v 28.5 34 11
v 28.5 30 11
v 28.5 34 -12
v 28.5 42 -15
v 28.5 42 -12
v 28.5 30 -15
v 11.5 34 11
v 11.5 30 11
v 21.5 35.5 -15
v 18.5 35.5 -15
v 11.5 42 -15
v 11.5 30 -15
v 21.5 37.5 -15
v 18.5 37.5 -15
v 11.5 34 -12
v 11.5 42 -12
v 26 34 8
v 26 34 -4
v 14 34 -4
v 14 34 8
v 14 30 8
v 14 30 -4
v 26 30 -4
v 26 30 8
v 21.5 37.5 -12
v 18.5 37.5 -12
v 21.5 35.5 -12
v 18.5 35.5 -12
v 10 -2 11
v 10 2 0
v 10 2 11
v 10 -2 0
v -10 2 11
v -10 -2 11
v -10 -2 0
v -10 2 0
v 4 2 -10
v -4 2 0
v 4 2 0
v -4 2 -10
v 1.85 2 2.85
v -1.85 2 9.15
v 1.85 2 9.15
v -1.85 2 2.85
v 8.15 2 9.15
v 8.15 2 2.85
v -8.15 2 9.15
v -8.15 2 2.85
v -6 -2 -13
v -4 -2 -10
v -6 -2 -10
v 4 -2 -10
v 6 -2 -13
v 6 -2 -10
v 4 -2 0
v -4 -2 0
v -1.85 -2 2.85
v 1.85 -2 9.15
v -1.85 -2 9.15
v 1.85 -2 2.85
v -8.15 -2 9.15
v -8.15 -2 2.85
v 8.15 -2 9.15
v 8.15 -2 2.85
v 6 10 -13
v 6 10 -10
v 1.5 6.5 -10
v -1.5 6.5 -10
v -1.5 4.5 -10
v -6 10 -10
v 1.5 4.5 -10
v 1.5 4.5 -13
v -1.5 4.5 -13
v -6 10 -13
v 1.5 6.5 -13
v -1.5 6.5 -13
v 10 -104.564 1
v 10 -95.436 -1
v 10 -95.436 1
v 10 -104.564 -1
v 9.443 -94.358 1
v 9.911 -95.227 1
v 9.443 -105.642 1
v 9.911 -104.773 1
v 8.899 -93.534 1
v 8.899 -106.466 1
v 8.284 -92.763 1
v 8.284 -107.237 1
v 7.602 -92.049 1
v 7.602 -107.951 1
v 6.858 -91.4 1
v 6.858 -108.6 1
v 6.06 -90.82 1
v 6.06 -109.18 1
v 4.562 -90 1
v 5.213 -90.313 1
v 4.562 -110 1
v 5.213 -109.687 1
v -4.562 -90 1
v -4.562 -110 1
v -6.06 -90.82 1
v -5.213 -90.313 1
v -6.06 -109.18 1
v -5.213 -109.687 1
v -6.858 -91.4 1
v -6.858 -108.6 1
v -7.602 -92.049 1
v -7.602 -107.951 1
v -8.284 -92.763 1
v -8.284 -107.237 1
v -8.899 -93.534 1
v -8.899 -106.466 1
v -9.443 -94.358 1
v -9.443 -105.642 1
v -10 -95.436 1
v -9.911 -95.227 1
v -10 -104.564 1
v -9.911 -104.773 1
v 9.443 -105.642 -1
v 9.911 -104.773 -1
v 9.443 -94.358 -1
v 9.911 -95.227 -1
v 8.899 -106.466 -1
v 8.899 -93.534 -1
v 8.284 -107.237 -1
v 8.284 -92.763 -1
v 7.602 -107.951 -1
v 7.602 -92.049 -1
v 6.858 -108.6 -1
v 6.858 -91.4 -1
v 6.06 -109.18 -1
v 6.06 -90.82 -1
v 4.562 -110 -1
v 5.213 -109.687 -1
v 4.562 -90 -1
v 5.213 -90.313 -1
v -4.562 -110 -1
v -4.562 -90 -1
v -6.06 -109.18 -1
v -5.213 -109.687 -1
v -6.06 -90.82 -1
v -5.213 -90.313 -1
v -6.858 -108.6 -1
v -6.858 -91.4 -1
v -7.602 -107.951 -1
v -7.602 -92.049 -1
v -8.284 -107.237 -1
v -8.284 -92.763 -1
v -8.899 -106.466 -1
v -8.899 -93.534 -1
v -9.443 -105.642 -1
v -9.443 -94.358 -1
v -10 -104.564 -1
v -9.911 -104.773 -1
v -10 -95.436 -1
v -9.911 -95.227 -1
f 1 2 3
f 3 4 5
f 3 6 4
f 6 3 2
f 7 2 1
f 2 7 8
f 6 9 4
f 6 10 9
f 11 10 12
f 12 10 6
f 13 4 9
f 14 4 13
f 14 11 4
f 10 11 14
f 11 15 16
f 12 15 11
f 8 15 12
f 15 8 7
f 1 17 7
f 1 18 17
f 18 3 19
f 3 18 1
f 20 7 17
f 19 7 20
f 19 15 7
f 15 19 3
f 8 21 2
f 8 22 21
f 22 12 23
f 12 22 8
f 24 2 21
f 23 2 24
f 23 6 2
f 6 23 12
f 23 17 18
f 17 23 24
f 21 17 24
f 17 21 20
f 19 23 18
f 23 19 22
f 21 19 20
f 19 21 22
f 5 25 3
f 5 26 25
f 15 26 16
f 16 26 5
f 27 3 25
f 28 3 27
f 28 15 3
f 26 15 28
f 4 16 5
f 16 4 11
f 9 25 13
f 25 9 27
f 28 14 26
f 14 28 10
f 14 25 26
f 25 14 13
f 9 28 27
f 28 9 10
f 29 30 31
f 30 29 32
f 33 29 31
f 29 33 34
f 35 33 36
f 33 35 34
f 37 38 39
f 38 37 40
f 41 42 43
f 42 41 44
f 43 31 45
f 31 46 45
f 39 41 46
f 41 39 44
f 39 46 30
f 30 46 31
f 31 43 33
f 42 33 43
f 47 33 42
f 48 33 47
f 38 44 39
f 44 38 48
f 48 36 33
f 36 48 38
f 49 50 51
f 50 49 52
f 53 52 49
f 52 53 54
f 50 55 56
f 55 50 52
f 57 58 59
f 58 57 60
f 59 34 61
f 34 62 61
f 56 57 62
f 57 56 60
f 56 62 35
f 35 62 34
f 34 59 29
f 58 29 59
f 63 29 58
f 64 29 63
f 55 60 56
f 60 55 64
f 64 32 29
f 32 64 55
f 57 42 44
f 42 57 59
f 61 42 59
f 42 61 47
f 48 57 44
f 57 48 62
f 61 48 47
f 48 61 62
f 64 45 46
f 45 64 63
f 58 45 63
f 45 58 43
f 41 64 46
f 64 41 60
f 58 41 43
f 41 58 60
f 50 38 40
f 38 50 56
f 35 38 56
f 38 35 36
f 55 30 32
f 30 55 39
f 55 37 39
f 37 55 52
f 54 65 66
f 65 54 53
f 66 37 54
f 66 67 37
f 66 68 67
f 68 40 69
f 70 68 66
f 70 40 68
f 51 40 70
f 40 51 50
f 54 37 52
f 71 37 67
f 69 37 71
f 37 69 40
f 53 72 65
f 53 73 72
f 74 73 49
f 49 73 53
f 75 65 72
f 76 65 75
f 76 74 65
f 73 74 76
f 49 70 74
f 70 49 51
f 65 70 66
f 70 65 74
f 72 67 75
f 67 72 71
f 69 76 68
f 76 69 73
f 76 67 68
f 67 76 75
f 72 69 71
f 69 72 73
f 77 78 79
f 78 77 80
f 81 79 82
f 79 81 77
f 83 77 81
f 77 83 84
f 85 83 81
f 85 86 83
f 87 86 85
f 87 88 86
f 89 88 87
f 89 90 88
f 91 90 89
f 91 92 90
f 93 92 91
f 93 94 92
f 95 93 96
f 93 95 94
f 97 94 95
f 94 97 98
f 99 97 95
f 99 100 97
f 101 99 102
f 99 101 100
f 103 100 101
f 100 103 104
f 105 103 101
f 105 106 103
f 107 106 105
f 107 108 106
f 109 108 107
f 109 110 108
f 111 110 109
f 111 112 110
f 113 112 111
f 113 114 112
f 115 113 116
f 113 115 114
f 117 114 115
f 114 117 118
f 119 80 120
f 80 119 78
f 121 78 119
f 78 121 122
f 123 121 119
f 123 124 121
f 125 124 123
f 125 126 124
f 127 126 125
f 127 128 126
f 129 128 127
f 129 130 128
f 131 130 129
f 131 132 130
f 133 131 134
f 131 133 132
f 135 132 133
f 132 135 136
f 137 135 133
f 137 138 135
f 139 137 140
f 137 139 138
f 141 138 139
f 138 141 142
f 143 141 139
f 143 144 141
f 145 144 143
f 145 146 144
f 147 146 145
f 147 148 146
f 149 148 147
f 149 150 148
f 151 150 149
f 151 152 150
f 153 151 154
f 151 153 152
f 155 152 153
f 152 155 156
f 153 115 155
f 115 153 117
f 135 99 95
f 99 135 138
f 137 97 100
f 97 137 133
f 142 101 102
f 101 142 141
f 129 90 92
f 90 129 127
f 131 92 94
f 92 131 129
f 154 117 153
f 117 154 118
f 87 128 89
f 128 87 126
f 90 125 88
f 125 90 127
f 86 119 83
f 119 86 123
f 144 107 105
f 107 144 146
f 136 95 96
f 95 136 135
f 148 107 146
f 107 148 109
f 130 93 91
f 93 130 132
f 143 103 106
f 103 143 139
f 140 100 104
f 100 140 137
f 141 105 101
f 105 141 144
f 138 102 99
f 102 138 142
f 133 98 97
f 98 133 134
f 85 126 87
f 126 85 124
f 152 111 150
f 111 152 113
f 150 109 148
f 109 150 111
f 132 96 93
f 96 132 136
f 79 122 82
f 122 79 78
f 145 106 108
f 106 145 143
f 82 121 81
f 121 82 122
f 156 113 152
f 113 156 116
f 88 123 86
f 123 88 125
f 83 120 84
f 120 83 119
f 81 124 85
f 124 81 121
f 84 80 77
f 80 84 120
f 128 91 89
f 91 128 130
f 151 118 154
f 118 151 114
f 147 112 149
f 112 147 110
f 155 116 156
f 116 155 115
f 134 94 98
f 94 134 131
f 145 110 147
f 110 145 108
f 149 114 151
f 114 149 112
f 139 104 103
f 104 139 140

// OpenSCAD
$fn=70;
//house:7x2.5x4cm

//last edit: 5 Feb 20
//translate([10,10,10]) color("green")
//import("big_base2.stl")

base_l=100;

back_color="darkgray";
back_trans=0.6;

//wheel center theke 80cm. max.

//translate([15,15,20.5]) rotate([-90,0,0]) base();
//
//difference() 
//{
//translate([-1.5,-5,0]) cube([base_l, 67,2]);
//    
//    
//translate([-1.5,32,0]) 
//    difference(){
//        curve_base();
//        translate([8,-18,-2])
//        cube([16,36,6]);
//        
//         translate([44,-15,-2])
//        cube([22,30,6]);
//    }
//// sofar(wh=false);
//  sofar(wh=true);
//    
//    c_hole();
//}
//translate([40,20,3])
//color("red") cube([40, 30, 18]);
// 
translate([20,32,12]) 
translate([0,0,-14]) 
//base_top();

//base_top_big();

button();

//cube([85,50,4]); //reference.

 
 design_tmp2();

//temporary design.
translate([0,-100,0]) {
//    design_tmp(); 
    difference() {
         cube([20,20,2], center=true);
    difference(){
    cube([20,20,2], center=true);
    cylinder(r=11, h=3, center=true);
    }
}
}

module design_tmp2() {
     difference(){
    cube([20,4,22], center=true);
        translate([-5 ,0,6])
        cube([6.3, 5,6.3], center=true);
          translate([5,0,6])
        cube([6.3, 5,6.3], center=true);
         
         translate([-14,0,-10])
        cube([20, 5,20], center=true);
         
         translate([14,0,-10])
        cube([20, 5,20], center=true);
    }
    translate([0,4,-11.5])
    difference(){
    cube([12,12,3],center=true);
        translate([0,1.5,0])
        cube([3,2,5], center=true);
        
//        translate([0,-4.5,0])
//        cube([3,2,5], center=true);
    }
}

module base_top() {
    
   
    
      difference() {
    hull() {
    sphere(r=24);
//        cylinder(r=24, h=10);
    translate([30,0,03]) sphere(r=26);
    }
     translate([-20,0,-30]) cube([20,130,180], center=true);
    
     translate([0,0,-30]) cube([180,160,80], center=true);
    
    
     for(i=[0:1]) {
        translate([-5,-18+i*36,0])
    cylinder(r=1.5, h=20);
        translate([45,-16+i*32,0]) cylinder(r=1.5, h=40);
    }
    
    hull(){
        translate([-15,0,0])
         cylinder(r=24, h=5);
    translate([30,0,00]) sphere(r=26);
    }
}
    
//    difference()
//    {
//    color("blue") sphere(r=60, center=true);
//    translate([0,0,-20]) cube([130,130,80], center=true);
//    }
}


module base_top_big() {
    
   br=30;
   bd=36;
    
      difference() 
    {
    hull() {
    sphere(r=br+4);
//        cylinder(r=24, h=10);
    translate([bd,0,10]) sphere(r=br+2);
    }
     translate([-30,0,-30]) cube([20,130,180], center=true);
    
       translate([0,0,-8]) cube([80, 80,50], center=true);
    
     translate([0,0,-31]) cube([180,160,80], center=true);
    
    
      hull() {
    sphere(r=br-2+4);
//        cylinder(r=24, h=10);
    translate([bd,0,10]) sphere(r=br);
    }
    
 
////    
//    hull(){
//        translate([-15,0,0])
//         cylinder(r=24, h=5);
//    translate([30,0,00]) sphere(r=26);
//    }
}
//    
//    difference()
//    {
//    color("blue") sphere(r=60, center=true);
//    translate([0,0,-20]) cube([130,130,80], center=true);
//    }
}




module curve_base() {
    
  hull()
    {
        
        cube([3,30,3], center=true);
        translate([5,0,0])cube([3,50,3], center=true);
        translate([12,0,0])cube([3,60,3], center=true);
        
        translate([30,0,0])cube([3,62,3], center=true);
        
        translate([50,0,0])cube([3,60,3], center=true);
        translate([70,0,0])cube([3,53,3], center=true);
        translate([80,0,0])cube([3,40,3], center=true);
         translate([87,0,0])cube([3,38,3], center=true);
         translate([96,0,0])cube([3,24,3], center=true);
         translate([100,0,0])cube([3,10,3], center=true);
    }  
}

module c_hole() {
    color("red") cube([3,2,12], center=true);
}

module sofar(wh=true){
    
if (wh==true) {
for(i=[0:2])
translate([12,2+i*20,20])
rotate([-90,0,0])
color("blue", 0.7) single_rotor();
}


translate([12,6,3]) c_hole();
translate([18,6,3]) c_hole();

//creating optional holes.
for(i=[0:3]) {
translate([35,20+i*10,-5]) color("red") cube([2,3,12]);
translate([35+18,20+i*10,-5]) color("red") cube([2,3,12]);
translate([35+36,20+i*10,-5]) color("red") cube([2,3,12]);
}
translate([77,30-10 ,-5]) color("red") cube([12,24,16]);
translate([92,30-4,-5]) color("red") cube([3,10,12]);
//box part and base

//translate([-50,0,0])  //positioning
translate([15,15,20.5])
rotate([-90,0,0])
difference()
{
    union(){
       color("darkgray", 0.5) base(); 
//        translate([-30,0,0])  //positioning
       for(i=[0:2]) {
           difference(){
            translate([0,0,i*20]) color("darkgray", 0.8) box(); 
         translate([-15,11,-1.5+i*20]) 
        cube([30,2,3]); //middle con cut 
           }
           
           translate([-15, 14, -1.5+i*20])  color("red") cube([2,12,3]); 
           
             translate([12.5, 14, -1.5+i*20])  color("red") cube([2,12,3]);
           
       }  
    }
    
    
    
         for(i=[0:2])
        translate([-15,11,-1.5+i*20]) 
        cube([30,2,3]); //middle con cut 
}
 
//the connector
//translate([-50-30,-12+5,5])  //positioning
translate([15,2.5,8])  //positioning
translate([-11,11,0]) 
for(i=[0:2]) { 
    translate([0, i*20, 0]) 
cube([22,3-0.5,2-0.8]); //middle con cut
}

 


 
rotate([0,0,5]) 
translate([ 40,-3,16]) {
    color(back_color, back_trans) button();
    translate([0,4.5,-12]) c_hole();
//    translate([0,-4.5,-12]) c_hole();
}

rotate([0,0,5]) 
translate([ 58,-2,16]){ 
    color(back_color, back_trans) button(); 
    translate([0,4.5,-12])  c_hole();
//    translate([0,-4.5,-12]) c_hole();
}

}



module button(){
    
    difference(){
    cube([17,4,26], center=true);
        translate([0,0,4])
        cube([12, 5,12], center=true);
    }
    translate([0,4,-11.5])
    difference(){
    cube([17,12,3],center=true);
        translate([0,0.5,0])
        cube([3,2,5], center=true);
        
//        translate([0,-4.5,0])
//        cube([3,2,5], center=true);
    }
}

module nano_box(){
    
    difference(){
    cube([48,6,22], center=true);
        translate([0,3,0])
         cube([44,8,17.8], center=true);
    }
    
    
//    translate([0,5,-2])
//    cube([44,2,4]);
    
    
//    cube([3,18,2]);
//    
//    cube([44,3,2]);
//    translate([2,1.5,-3])
//        cylinder(d=1.2,h=5);
//    translate([2+40.7,1.5,-3])
//        cylinder(d=1.2,h=5);
//    
//     translate([2 ,1.5+15,-3])
//        cylinder(d=1.2,h=5);
    
}


module base(){
    difference()
    {
     union(){
    translate([0, 16, 18])
    cube([21, 3,60], center=true);   //long base
    
      
         
        for(i=[0,10,20]) 
      translate([0,0,12.5-i*2]){
    difference(){
    translate([10, 14.5, 4+20])   //left butterfly
        cube([6,3,7]);    
      translate([12.5, 14, 6+20])   cube([2,5,3]);    
     }
   difference(){
    translate([-16.5 , 14.5, 4+20])   //right butterfly
        cube([6,3,7]);    
      translate([-15, 14, 6+20])  cube([2,5,3]);    
     }
    }     
   
    
     for(i=[0:2])
    translate([0,0,20*i]) {
    translate([7.7, 9, -3.5])   //left side con
    cube([3,6.5,7]);
     translate([5, 9, -3.5+6.2])   //left side exp
    cube([5.5,6,2]);  
     translate([-5-5.5, 9, -3.5+6.2])   //right side exp
    cube([5.5,6,2]);  
    translate([-7.7-3, 9, -3.5])  //right side con
    cube([3,6.5,7]);
    }
 

     }
      
     
     { //two box hole conn.
     translate([-3, 16, -9])
    cube([3, 8,2], center=true); //space cut for wire.
     translate([3, 16, -9])
    cube([3, 8,2], center=true); //space cut for wire.
     }
     
     for(i=[0:2])
      translate([0, 16, 7+i*20])
        cube([10, 8,12], center=true); //space cut for wire.
 }
 
    for(i=[0:2])
        translate([-10,12,-5.3+i*20]) 
            cube([20,3,2]); //middle conn
 
 
}

module single_rotor() {
upper();
lower();
outer();


n2 = 77; //teeth 
 
mm_per_tooth = 1; 
thickness    = 11;
hole         = 10; 

 
translate([0,0, -2.5])
gear(mm_per_tooth,n2,thickness,hole,0,168);

outer_rim_d=24;   //will be 24
translate([0,0, 3])
difference(){
cylinder(d=outer_rim_d, h=10, center=true, $fn=100);
   cylinder(d=12, h=19, center=true, $fn=100);
     
}
}



module box(){
    //4, 13, 14
    difference()
    {
        translate([0,3,0])
    cube([15,16+7,6], center=true);
       union() {
        cube([12.6,13.6,8], center=true); //inner box
        translate([0,8,3])
       cube([12.6,24,6], center=true); //half cut
        }
        
        
//        translate([-10,13,-1.5]) {
//        cube([30,2,3]);
//        }
    }
    
    
//    translate([0,1,0]) 
//    difference()
//    {
//    translate([0,13.5,-4]) 
//    cube([15,5,8], center=true); //half cut
//        
//        translate([0,12,-4]) 
//    cube([12,5,12], center=true); //half cut
//        
//          
//        translate([-10,12.5,-6]) {
//        cube([20,2,3]);
//        }
//    }
    
}
module upper() {
    difference() {
    cylinder(r=5, h=5, center=true);
        cylinder(r=3.2, h=6, center=true, $fn=100);
    }

    translate([0,3,-0.5])
    cube([6,2,4], center=true);
}

module lower() { 
    translate([0,0, 4])
    difference() {
    cylinder(d=9, h=4, center=true);
        cylinder(d=7.5, h=6, center=true, $fn=100);
    }   
}

module outer(){
    difference() {
        translate([0,0,3])
    cylinder(d=12, h=11, center=true);
        cylinder(d=7.75, h=26, center=true, $fn=100);
    }
}


//////////////////////////////////////////////////////////////////////////////////////////////
// Public Domain Parametric Involute Spur Gear (and involute helical gear and involute rack)
// version 1.1
// by Leemon Baird, 2011, Leemon@Leemon.com
//http://www.thingiverse.com/thing:5505
//
// This file is public domain.  Use it for any purpose, including commercial
// applications.  Attribution would be nice, but is not required.  There is
// no warranty of any kind, including its correctness, usefulness, or safety.
// 
// This is parameterized involute spur (or helical) gear.  It is much simpler and less powerful than
// others on Thingiverse.  But it is public domain.  I implemented it from scratch from the 
// descriptions and equations on Wikipedia and the web, using Mathematica for calculations and testing,
// and I now release it into the public domain.
//
//		http://en.wikipedia.org/wiki/Involute_gear
//		http://en.wikipedia.org/wiki/Gear
//		http://en.wikipedia.org/wiki/List_of_gear_nomenclature
//		http://gtrebaol.free.fr/doc/catia/spur_gear.html
//		http://www.cs.cmu.edu/~rapidproto/mechanisms/chpt7.html
//
// The module gear() gives an involute spur gear, with reasonable defaults for all the parameters.
// Normally, you should just choose the first 4 parameters, and let the rest be default values.
// The module gear() gives a gear in the XY plane, centered on the origin, with one tooth centered on
// the positive Y axis.  The various functions below it take the same parameters, and return various
// measurements for the gear.  The most important is pitch_radius, which tells how far apart to space
// gears that are meshing, and adendum_radius, which gives the size of the region filled by the gear.
// A gear has a "pitch circle", which is an invisible circle that cuts through the middle of each
// tooth (though not the exact center). In order for two gears to mesh, their pitch circles should 
// just touch.  So the distance between their centers should be pitch_radius() for one, plus pitch_radius() 
// for the other, which gives the radii of their pitch circles.
//
// In order for two gears to mesh, they must have the same mm_per_tooth and pressure_angle parameters.  
// mm_per_tooth gives the number of millimeters of arc around the pitch circle covered by one tooth and one
// space between teeth.  The pitch angle controls how flat or bulged the sides of the teeth are.  Common
// values include 14.5 degrees and 20 degrees, and occasionally 25.  Though I've seen 28 recommended for
// plastic gears. Larger numbers bulge out more, giving stronger teeth, so 28 degrees is the default here.
//
// The ratio of number_of_teeth for two meshing gears gives how many times one will make a full 
// revolution when the the other makes one full revolution.  If the two numbers are coprime (i.e. 
// are not both divisible by the same number greater than 1), then every tooth on one gear
// will meet every tooth on the other, for more even wear.  So coprime numbers of teeth are good.
//
// The module rack() gives a rack, which is a bar with teeth.  A rack can mesh with any
// gear that has the same mm_per_tooth and pressure_angle.
//
// Some terminology: 
// The outline of a gear is a smooth circle (the "pitch circle") which has mountains and valleys
// added so it is toothed.  So there is an inner circle (the "root circle") that touches the 
// base of all the teeth, an outer circle that touches the tips of all the teeth,
// and the invisible pitch circle in between them.  There is also a "base circle", which can be smaller than
// all three of the others, which controls the shape of the teeth.  The side of each tooth lies on the path 
// that the end of a string would follow if it were wrapped tightly around the base circle, then slowly unwound.  
// That shape is an "involute", which gives this type of gear its name.
//
//////////////////////////////////////////////////////////////////////////////////////////////

//An involute spur gear, with reasonable defaults for all the parameters.
//Normally, you should just choose the first 4 parameters, and let the rest be default values.
//Meshing gears must match in mm_per_tooth, pressure_angle, and twist,
//and be separated by the sum of their pitch radii, which can be found with pitch_radius().
module gear (
	mm_per_tooth    = 3,    //this is the "circular pitch", the circumference of the pitch circle divided by the number of teeth
	number_of_teeth = 11,   //total number of teeth around the entire perimeter
	thickness       = 6,    //thickness of gear in mm
	hole_diameter   = 3,    //diameter of the hole in the center, in mm
	twist           = 0,    //teeth rotate this many degrees from bottom of gear to top.  360 makes the gear a screw with each thread going around once
	teeth_to_hide   = 0,    //number of teeth to delete to make this only a fraction of a circle
	pressure_angle  = 28,   //Controls how straight or bulged the tooth sides are. In degrees.
	clearance       = 0.0,  //gap between top of a tooth on one gear and bottom of valley on a meshing gear (in millimeters)
	backlash        = 0.0,   //gap between two meshing teeth, in the direction along the circumference of the pitch circle
    center = false,   // center gear by z axis
    $fn = 20   // number of fragments to draw hole cylinder
) {
	p  = mm_per_tooth * number_of_teeth / PI / 2;  //radius of pitch circle
	c  = p + mm_per_tooth / PI - clearance;        //radius of outer circle
	b  = p*cos(pressure_angle);                    //radius of base circle
	r  = p-(c-p)-clearance;                        //radius of root circle
	t  = mm_per_tooth/2-backlash/2;                //tooth thickness at pitch circle
	k  = -iang(b, p) - t/2/p/PI*180;             //angle to where involute meets base circle on each side of tooth
    difference() {
        for (i = [0:(number_of_teeth-teeth_to_hide-1 > 0 ? 1 : -1):number_of_teeth-teeth_to_hide-1] )
            rotate([0,0,i*360/number_of_teeth])
                linear_extrude(height = thickness, center = center, convexity = 10, twist = twist)
                    polygon(
                        points=[
                            [0, -hole_diameter/10],
                            polar(r, -181/number_of_teeth),
                            polar(r, r<b ? k : -180/number_of_teeth),
                            q7(0/5,r,b,c,k, 1),q7(1/5,r,b,c,k, 1),q7(2/5,r,b,c,k, 1),q7(3/5,r,b,c,k, 1),q7(4/5,r,b,c,k, 1),q7(5/5,r,b,c,k, 1),
                            q7(5/5,r,b,c,k,-1),q7(4/5,r,b,c,k,-1),q7(3/5,r,b,c,k,-1),q7(2/5,r,b,c,k,-1),q7(1/5,r,b,c,k,-1),q7(0/5,r,b,c,k,-1),
                            polar(r, r<b ? -k : 180/number_of_teeth),
                            polar(r, 181/number_of_teeth)
                        ],
                        paths=[[0,1,2,3,4,5,6,7,8,9,10,11,12,13,14,15,16]]
                    );
//        translate([0,0, (center ? 0 : -0.1)])
            cylinder(h=thickness+0.2, r=hole_diameter/2, center=center, $fn=$fn);
    }
};	
//these 4 functions are used by gear
function polar(r,theta)   = r*[sin(theta), cos(theta)];                            //convert polar to cartesian coordinates
function iang(r1,r2)      = sqrt((r2/r1)*(r2/r1) - 1)/PI*180 - acos(r1/r2); //unwind a string this many degrees to go from radius r1 to radius r2
function q7(f,r,b,r2,t,s) = q6(b,s,t,(1-f)*max(b,r)+f*r2);                         //radius a fraction f up the curved side of the tooth 
function q6(b,s,t,d)      = polar(d,s*(iang(b,d)+t));                              //point at radius d on the involute curve
 

//These 5 functions let the user find the derived dimensions of the gear.
//A gear fits within a circle of radius outer_radius, and two gears should have
//their centers separated by the sum of their pictch_radius.
function circular_pitch  (mm_per_tooth=3) = mm_per_tooth;                     //tooth density expressed as "circular pitch" in millimeters
function diametral_pitch (mm_per_tooth=3) = PI / mm_per_tooth;         //tooth density expressed as "diametral pitch" in teeth per millimeter
function module_value    (mm_per_tooth=3) = mm_per_tooth / PI;                //tooth density expressed as "module" or "modulus" in millimeters
function pitch_radius    (mm_per_tooth=3,number_of_teeth=11) = mm_per_tooth * number_of_teeth / PI / 2;
function outer_radius    (mm_per_tooth=3,number_of_teeth=11,clearance=0.1)    //The gear fits entirely within a cylinder of this radius.
	= mm_per_tooth*(1+number_of_teeth/2)/PI  - clearance;              

 
